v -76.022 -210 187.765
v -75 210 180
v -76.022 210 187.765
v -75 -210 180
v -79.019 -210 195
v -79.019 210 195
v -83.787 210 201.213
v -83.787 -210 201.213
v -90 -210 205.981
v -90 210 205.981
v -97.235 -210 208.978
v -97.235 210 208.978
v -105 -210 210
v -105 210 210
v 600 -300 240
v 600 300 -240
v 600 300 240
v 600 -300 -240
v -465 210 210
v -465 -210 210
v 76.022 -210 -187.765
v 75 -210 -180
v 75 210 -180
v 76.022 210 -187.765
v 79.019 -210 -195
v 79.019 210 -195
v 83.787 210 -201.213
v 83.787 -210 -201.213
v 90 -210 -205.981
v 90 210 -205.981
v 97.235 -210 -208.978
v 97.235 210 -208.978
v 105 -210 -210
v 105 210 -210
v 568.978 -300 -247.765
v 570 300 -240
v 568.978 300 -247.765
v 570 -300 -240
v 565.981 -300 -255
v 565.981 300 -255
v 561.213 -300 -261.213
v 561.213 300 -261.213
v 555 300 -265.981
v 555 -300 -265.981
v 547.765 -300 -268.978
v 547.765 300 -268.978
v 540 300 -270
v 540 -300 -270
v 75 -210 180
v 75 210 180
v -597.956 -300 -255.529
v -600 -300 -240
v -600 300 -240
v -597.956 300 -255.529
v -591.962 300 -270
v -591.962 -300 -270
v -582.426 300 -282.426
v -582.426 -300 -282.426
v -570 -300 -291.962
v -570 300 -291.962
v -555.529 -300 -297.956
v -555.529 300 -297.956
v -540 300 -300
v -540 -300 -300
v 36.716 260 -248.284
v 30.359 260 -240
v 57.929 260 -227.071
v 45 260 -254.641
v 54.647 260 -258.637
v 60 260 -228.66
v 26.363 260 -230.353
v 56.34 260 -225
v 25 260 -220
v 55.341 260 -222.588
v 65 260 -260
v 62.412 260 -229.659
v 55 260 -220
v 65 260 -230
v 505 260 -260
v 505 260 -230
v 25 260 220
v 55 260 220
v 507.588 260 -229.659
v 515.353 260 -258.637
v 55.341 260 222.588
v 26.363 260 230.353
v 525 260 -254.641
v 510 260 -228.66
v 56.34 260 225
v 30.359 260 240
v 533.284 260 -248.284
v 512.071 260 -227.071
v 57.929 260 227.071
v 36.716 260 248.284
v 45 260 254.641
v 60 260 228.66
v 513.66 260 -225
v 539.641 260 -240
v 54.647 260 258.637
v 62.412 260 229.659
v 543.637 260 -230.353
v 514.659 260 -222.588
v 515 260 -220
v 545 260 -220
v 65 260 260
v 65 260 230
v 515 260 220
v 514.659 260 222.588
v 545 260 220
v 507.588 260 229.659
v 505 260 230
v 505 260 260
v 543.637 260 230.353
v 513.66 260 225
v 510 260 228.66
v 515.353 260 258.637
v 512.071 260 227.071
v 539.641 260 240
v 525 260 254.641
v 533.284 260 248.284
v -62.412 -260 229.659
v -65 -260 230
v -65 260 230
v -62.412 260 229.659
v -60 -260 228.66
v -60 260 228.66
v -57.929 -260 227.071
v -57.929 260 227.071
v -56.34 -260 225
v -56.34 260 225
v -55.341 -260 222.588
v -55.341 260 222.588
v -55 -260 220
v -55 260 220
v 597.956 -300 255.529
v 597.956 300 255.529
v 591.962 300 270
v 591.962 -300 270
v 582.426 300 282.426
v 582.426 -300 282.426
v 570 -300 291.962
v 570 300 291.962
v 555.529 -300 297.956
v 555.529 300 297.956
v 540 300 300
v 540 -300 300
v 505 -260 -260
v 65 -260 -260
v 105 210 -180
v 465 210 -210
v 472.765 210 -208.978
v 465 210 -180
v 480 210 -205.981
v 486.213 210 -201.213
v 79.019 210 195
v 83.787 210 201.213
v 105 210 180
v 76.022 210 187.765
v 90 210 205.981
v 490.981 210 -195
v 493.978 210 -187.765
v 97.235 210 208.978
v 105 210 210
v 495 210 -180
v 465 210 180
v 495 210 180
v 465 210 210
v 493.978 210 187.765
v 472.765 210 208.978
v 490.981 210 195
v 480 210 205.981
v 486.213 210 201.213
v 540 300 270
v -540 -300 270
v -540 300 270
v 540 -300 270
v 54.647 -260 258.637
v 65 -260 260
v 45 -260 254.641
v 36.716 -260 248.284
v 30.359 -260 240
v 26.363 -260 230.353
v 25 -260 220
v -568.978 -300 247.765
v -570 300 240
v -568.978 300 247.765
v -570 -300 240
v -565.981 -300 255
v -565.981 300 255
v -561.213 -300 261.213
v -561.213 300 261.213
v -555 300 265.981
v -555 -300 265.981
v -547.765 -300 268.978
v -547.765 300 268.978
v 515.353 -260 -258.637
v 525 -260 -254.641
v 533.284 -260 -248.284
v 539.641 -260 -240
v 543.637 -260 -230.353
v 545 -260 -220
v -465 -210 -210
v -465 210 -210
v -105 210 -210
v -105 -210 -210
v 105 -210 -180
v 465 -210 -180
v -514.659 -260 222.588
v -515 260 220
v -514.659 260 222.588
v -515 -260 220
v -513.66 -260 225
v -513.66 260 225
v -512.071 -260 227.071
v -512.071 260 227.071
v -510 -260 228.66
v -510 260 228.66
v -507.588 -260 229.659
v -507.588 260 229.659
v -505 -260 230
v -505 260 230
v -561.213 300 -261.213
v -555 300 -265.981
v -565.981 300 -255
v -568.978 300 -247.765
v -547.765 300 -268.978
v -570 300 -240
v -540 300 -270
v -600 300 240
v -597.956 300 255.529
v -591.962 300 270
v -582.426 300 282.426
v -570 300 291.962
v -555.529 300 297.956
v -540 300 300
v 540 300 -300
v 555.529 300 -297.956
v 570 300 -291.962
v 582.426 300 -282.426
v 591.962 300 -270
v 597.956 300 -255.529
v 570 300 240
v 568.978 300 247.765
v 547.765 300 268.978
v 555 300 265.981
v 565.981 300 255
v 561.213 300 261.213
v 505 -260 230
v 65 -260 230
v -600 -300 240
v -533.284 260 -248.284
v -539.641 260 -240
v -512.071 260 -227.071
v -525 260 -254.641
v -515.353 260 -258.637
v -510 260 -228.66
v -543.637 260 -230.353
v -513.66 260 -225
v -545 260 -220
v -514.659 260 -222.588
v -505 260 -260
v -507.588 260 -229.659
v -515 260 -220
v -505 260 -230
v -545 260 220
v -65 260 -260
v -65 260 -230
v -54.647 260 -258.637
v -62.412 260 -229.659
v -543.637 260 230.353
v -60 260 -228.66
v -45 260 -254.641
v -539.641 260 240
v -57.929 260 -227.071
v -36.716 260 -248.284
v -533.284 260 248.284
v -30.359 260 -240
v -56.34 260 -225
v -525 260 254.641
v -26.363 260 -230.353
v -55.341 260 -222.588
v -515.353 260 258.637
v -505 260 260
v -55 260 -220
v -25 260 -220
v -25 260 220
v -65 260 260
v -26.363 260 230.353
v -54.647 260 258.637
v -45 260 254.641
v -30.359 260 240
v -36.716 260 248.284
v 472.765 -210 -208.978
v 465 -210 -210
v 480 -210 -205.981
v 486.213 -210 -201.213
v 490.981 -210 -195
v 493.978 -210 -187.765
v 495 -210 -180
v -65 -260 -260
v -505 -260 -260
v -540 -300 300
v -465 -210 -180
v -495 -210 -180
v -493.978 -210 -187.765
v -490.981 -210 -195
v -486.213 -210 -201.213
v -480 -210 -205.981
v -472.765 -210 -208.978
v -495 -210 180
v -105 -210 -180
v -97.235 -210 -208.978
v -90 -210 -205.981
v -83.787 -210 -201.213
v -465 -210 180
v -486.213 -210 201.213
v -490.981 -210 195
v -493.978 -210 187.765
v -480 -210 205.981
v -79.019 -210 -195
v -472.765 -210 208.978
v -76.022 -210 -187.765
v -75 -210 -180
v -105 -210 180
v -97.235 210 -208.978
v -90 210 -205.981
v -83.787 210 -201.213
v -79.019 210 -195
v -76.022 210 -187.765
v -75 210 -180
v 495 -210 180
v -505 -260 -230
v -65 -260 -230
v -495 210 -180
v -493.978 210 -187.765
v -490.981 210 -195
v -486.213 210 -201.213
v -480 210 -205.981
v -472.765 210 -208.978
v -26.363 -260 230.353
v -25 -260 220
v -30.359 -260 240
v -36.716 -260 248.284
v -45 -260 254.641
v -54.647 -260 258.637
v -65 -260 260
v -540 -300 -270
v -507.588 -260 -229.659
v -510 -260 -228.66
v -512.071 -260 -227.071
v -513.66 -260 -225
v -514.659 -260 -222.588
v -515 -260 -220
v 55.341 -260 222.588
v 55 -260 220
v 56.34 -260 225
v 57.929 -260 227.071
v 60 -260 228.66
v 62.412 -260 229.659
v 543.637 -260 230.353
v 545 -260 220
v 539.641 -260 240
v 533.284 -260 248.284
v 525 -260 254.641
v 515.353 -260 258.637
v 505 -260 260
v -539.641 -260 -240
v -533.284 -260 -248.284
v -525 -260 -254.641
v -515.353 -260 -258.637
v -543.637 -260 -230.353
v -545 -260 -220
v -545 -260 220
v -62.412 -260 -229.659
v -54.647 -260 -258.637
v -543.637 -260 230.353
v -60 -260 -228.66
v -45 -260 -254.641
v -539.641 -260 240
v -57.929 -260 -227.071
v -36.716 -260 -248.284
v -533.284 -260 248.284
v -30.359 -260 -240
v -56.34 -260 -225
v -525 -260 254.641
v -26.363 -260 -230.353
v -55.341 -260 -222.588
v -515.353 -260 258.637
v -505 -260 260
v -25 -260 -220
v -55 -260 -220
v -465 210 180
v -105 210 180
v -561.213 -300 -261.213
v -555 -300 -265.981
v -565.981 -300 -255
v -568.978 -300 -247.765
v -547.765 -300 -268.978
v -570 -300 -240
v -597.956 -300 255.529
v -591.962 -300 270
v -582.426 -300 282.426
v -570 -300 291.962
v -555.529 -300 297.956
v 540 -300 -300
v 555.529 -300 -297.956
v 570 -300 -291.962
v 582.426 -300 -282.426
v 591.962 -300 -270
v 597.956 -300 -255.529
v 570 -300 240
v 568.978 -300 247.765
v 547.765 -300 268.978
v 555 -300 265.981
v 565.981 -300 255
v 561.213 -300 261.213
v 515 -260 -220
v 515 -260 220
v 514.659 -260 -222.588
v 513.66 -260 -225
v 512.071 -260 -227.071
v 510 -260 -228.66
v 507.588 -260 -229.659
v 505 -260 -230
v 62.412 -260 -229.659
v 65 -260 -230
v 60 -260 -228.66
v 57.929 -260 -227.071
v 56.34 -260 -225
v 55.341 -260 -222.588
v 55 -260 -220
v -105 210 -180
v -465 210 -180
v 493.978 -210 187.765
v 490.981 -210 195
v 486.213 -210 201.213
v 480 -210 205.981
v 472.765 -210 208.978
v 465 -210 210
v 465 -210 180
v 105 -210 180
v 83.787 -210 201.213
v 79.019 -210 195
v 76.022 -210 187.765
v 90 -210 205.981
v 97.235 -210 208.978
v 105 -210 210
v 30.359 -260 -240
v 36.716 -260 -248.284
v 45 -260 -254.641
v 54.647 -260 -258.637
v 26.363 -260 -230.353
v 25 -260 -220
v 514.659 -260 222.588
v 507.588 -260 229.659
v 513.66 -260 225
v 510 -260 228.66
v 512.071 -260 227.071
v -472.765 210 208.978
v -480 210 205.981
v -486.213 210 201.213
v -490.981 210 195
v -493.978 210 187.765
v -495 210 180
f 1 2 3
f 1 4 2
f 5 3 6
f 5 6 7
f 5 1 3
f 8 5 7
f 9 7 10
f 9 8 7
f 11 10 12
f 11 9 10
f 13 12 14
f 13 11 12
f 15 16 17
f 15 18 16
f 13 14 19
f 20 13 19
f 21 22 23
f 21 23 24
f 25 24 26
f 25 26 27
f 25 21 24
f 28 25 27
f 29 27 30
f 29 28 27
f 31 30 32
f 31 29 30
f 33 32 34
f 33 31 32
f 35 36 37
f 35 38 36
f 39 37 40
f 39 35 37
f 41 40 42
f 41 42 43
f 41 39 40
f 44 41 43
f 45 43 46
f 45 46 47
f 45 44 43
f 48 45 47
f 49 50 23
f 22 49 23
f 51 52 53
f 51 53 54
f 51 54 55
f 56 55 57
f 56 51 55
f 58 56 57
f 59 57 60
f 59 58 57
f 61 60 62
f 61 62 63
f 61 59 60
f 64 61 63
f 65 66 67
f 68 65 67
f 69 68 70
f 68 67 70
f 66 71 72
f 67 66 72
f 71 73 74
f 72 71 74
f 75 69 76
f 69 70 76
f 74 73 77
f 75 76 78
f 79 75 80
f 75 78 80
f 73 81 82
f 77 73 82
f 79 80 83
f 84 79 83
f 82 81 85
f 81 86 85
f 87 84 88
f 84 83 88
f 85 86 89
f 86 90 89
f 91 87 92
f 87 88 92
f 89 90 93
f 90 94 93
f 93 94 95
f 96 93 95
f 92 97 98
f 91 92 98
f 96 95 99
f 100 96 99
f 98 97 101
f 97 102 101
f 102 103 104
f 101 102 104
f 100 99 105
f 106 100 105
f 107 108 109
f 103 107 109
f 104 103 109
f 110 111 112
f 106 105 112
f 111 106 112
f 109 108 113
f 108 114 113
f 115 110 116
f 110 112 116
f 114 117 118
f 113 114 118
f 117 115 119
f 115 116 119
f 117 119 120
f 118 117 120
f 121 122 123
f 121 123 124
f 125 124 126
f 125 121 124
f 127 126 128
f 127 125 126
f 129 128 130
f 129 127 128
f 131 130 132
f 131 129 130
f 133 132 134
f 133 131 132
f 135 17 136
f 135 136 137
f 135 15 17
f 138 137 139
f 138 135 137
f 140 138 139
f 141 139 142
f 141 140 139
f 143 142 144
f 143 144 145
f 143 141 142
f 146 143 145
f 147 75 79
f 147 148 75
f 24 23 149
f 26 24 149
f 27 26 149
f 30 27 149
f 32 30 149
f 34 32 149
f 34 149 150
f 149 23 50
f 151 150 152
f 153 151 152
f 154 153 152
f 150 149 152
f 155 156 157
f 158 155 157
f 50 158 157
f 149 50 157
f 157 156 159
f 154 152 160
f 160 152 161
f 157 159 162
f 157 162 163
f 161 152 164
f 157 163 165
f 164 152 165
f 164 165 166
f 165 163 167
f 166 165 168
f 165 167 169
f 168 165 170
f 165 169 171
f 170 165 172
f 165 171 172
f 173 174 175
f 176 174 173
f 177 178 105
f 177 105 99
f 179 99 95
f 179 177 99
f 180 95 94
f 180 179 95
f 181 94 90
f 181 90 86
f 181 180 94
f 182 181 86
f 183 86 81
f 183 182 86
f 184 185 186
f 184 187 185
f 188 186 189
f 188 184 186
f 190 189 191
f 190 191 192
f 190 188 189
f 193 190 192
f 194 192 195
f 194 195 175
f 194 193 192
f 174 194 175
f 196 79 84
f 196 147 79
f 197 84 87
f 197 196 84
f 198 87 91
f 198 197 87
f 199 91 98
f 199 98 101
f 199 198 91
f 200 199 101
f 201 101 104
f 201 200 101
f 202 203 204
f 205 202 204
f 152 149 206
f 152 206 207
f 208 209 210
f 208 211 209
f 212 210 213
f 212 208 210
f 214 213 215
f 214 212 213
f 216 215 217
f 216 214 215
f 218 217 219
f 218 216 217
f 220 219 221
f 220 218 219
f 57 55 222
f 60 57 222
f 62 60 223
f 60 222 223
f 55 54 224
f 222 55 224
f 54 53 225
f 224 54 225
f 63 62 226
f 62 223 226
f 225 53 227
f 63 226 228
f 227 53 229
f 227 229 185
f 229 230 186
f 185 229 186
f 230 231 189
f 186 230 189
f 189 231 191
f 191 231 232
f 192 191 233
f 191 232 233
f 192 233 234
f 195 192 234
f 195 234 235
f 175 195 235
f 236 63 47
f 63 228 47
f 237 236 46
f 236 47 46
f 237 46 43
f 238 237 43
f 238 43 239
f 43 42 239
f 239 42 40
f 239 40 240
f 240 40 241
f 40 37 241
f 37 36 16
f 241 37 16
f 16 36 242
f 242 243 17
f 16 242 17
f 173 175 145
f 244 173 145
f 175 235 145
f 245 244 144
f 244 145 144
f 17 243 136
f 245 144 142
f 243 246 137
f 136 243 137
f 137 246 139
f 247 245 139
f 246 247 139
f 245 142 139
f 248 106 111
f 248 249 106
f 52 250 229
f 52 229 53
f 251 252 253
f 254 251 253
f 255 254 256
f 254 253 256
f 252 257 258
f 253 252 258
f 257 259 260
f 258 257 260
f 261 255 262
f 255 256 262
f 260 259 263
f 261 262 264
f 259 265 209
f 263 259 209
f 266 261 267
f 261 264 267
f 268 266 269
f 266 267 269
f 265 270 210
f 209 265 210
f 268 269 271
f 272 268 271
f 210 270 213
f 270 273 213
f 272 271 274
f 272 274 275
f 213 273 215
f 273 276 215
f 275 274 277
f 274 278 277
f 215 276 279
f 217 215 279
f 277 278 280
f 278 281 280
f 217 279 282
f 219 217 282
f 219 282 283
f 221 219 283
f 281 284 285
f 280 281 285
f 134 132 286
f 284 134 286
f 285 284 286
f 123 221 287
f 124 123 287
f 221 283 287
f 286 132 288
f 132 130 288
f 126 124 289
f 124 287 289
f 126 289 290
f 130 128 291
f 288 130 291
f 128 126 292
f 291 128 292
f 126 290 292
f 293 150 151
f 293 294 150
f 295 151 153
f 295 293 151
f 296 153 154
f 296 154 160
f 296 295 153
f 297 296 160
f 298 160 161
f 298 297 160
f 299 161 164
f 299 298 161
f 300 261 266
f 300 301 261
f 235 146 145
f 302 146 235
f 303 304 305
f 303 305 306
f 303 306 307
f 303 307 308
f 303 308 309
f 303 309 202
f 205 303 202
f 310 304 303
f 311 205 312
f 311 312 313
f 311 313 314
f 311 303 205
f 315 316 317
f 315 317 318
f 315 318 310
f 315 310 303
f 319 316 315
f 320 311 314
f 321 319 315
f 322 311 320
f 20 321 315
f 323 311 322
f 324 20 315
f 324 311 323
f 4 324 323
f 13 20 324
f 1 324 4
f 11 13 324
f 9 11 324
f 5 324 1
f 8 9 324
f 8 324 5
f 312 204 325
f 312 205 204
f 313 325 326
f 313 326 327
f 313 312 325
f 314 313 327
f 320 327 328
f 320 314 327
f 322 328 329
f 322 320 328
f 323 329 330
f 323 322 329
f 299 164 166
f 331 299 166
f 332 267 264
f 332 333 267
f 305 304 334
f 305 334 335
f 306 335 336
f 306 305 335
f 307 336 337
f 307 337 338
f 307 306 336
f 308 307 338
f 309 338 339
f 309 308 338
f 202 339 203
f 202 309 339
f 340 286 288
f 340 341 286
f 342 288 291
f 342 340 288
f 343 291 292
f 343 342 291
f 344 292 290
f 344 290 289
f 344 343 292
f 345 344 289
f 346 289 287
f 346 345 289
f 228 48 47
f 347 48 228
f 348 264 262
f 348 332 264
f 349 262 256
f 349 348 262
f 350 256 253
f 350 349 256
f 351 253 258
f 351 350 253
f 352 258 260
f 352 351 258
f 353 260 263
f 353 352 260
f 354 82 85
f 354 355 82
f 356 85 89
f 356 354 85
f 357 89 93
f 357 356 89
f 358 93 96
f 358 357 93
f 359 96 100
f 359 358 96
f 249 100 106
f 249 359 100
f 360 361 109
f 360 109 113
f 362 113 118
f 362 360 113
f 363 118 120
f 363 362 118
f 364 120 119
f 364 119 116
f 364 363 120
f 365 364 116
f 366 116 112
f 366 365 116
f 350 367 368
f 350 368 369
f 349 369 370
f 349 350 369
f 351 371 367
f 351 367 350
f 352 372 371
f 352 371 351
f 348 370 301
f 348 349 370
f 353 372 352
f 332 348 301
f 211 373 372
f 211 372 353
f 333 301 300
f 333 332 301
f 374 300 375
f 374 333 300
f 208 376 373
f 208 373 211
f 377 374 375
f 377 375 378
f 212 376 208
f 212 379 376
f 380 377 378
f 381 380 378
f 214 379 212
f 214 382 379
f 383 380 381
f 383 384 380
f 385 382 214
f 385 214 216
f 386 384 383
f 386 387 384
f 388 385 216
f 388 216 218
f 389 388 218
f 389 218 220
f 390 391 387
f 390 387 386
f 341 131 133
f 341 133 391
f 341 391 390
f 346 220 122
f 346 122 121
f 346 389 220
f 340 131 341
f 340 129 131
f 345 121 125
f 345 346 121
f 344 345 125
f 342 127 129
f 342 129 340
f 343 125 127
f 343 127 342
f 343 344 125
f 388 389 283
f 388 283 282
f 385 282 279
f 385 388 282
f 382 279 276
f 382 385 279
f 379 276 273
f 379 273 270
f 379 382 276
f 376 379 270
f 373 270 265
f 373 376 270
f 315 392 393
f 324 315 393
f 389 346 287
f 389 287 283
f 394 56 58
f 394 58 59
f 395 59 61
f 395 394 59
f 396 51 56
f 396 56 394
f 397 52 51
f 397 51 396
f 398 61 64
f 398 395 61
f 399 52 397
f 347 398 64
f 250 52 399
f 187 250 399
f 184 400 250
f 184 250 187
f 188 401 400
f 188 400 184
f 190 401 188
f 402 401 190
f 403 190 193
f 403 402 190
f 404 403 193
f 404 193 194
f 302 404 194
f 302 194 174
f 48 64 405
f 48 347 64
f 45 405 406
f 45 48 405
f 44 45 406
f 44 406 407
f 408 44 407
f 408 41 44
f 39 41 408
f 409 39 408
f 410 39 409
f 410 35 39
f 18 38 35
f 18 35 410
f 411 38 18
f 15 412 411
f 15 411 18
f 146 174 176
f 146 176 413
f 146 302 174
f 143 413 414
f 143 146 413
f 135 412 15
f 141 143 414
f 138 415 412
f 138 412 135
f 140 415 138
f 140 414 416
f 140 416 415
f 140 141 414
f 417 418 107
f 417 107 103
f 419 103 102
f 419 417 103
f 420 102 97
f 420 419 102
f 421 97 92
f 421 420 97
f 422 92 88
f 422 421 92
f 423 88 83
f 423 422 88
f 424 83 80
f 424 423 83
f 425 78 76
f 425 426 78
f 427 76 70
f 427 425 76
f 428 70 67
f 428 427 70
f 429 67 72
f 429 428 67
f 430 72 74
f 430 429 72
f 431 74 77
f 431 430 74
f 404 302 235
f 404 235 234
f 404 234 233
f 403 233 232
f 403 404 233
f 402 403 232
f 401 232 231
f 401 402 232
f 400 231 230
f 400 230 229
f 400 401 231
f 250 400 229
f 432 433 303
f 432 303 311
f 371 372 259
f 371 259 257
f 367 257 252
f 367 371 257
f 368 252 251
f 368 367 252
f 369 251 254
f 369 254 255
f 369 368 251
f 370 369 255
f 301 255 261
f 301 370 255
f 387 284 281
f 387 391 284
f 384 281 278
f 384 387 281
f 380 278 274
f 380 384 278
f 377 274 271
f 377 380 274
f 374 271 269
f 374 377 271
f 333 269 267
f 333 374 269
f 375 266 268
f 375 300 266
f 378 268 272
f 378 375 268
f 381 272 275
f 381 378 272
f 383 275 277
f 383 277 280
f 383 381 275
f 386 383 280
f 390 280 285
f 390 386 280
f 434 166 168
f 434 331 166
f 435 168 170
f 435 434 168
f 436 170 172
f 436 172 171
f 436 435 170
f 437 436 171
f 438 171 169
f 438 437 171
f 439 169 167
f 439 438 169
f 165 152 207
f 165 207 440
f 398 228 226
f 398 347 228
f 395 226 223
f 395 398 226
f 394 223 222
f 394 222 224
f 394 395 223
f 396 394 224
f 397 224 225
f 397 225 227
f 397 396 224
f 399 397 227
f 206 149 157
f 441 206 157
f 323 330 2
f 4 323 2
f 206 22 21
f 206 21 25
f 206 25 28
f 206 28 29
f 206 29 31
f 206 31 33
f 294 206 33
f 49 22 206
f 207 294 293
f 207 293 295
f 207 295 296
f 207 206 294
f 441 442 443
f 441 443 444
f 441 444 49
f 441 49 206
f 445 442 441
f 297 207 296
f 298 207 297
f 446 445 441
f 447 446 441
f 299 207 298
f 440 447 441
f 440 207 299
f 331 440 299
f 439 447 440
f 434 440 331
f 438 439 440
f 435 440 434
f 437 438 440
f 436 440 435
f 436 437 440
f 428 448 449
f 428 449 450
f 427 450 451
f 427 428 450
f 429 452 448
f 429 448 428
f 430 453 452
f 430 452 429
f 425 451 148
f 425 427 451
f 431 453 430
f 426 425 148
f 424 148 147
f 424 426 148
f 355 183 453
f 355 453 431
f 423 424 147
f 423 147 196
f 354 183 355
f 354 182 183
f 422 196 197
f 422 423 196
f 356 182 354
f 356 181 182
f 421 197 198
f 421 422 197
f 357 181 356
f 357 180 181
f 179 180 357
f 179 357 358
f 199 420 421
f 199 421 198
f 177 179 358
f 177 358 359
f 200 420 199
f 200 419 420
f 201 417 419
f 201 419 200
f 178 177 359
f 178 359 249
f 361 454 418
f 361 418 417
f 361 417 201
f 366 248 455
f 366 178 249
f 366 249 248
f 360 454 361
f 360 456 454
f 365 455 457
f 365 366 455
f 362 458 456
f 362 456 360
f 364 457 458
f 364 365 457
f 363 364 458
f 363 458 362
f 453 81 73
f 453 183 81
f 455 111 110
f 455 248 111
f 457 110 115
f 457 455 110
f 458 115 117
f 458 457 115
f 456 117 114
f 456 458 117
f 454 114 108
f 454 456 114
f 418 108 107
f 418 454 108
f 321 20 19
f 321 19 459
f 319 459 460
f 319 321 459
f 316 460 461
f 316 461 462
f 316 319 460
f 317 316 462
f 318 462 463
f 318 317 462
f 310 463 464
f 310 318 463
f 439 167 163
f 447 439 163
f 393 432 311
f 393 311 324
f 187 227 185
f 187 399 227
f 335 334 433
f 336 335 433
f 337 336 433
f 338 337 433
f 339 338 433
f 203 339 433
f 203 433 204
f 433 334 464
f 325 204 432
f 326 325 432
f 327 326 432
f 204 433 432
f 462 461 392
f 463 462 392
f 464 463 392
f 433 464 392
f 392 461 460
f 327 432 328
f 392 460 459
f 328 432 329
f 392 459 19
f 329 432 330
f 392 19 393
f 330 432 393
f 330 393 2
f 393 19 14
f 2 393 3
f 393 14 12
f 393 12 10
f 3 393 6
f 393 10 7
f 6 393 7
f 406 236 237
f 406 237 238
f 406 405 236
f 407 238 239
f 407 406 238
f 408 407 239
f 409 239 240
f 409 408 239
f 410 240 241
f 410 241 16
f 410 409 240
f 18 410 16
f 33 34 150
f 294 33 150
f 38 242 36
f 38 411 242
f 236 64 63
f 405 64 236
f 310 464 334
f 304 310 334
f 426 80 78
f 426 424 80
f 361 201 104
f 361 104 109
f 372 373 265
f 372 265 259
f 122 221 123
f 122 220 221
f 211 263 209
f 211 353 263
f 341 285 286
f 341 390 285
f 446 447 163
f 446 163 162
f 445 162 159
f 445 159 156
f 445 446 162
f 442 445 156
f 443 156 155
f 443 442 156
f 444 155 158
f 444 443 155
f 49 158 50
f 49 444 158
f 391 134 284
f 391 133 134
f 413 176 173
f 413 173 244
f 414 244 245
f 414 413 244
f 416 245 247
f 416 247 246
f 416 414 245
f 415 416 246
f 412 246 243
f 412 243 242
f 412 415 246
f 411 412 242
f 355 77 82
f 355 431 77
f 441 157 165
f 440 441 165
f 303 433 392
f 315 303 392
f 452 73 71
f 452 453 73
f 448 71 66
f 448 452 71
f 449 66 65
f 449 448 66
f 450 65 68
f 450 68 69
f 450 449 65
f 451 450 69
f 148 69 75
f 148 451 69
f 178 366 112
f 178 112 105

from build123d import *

# Parameters (mm, degrees)
F2_DEPTH = 300
F4_DEPTH = 260
F6_W     = 360
F6_H     = 360
F7_DEPTH = 210


with BuildPart() as f2:
    # F1 (on Front) → F2 (new body, symmetric)
    with BuildSketch(Plane.XZ):
        with BuildLine():
            ThreePointArc((600, 240), (582.4264068712, 282.4264068712), (540, 300))
            Line((540, 300), (-540, 300))
            ThreePointArc((-540, 300), (-582.4264068712, 282.4264068712), (-600, 240))
            Line((-600, 240), (-600, -240))
            ThreePointArc((-600, -240), (-582.4264068712, -282.4264068712), (-540, -300))
            Line((-540, -300), (540, -300))
            ThreePointArc((540, -300), (582.4264068712, -282.4264068712), (600, -240))
            Line((600, -240), (600, 240))
        make_face()
        with BuildLine():
            ThreePointArc((540, 270), (561.2132034356, 261.2132034356), (570, 240))
            Line((570, 240), (570, -240))
            ThreePointArc((570, -240), (561.2132034356, -261.2132034356), (540, -270))
            Line((540, -270), (-540, -270))
            ThreePointArc((-540, -270), (-561.2132034356, -261.2132034356), (-570, -240))
            Line((-570, -240), (-570, 240))
            ThreePointArc((-570, 240), (-561.2132034356, 261.2132034356), (-540, 270))
            Line((-540, 270), (540, 270))
        make_face(mode=Mode.SUBTRACT)
    extrude(amount=F2_DEPTH, both=True)


with BuildPart() as f4:
    # F3 (on Front) → F4 (new body, symmetric)
    with BuildSketch(Plane.XZ):
        with BuildLine():
            ThreePointArc((-25, 220), (-36.7157287525, 248.2842712475), (-65, 260))
            Line((-65, 260), (-505, 260))
            ThreePointArc((-505, 260), (-533.2842712475, 248.2842712475), (-545, 220))
            Line((-545, 220), (-545, -220))
            ThreePointArc((-545, -220), (-533.2842712475, -248.2842712475), (-505, -260))
            Line((-505, -260), (-65, -260))
            ThreePointArc((-65, -260), (-36.7157287525, -248.2842712475), (-25, -220))
            Line((-25, -220), (-25, 220))
        make_face()
        with BuildLine():
            Line((-505, 230), (-65, 230))
            ThreePointArc((-65, 230), (-57.9289321881, 227.0710678119), (-55, 220))
            Line((-55, 220), (-55, -220))
            ThreePointArc((-55, -220), (-57.9289321881, -227.0710678119), (-65, -230))
            Line((-65, -230), (-505, -230))
            ThreePointArc((-505, -230), (-512.0710678119, -227.0710678119), (-515, -220))
            Line((-515, -220), (-515, 220))
            ThreePointArc((-515, 220), (-512.0710678119, 227.0710678119), (-505, 230))
        make_face(mode=Mode.SUBTRACT)
    extrude(amount=F4_DEPTH, both=True)


with BuildPart() as f4b:
    # F3 (on Front) → F4, piece 2 (new body, symmetric)
    with BuildSketch(Plane.XZ):
        with BuildLine():
            ThreePointArc((545, 220), (533.2842712475, 248.2842712475), (505, 260))
            Line((505, 260), (65, 260))
            ThreePointArc((65, 260), (36.7157287525, 248.2842712475), (25, 220))
            Line((25, 220), (25, -220))
            ThreePointArc((25, -220), (36.7157287525, -248.2842712475), (65, -260))
            Line((65, -260), (505, -260))
            ThreePointArc((505, -260), (533.2842712475, -248.2842712475), (545, -220))
            Line((545, -220), (545, 220))
        make_face()
        with BuildLine():
            Line((515, 220), (515, -220))
            ThreePointArc((515, -220), (512.0710678119, -227.0710678119), (505, -230))
            Line((505, -230), (65, -230))
            ThreePointArc((65, -230), (57.9289321881, -227.0710678119), (55, -220))
            Line((55, -220), (55, 220))
            ThreePointArc((55, 220), (57.9289321881, 227.0710678119), (65, 230))
            Line((65, 230), (505, 230))
            ThreePointArc((505, 230), (512.0710678119, 227.0710678119), (515, 220))
        make_face(mode=Mode.SUBTRACT)
    extrude(amount=F4_DEPTH, both=True)


with BuildPart() as f4c:
    # F0 (on Front) → F4, piece 3 (new body, symmetric)
    with BuildSketch(Plane.XZ):
        with BuildLine():
            ThreePointArc((505, -260), (533.2842712475, -248.2842712475), (545, -220))
            Line((545, -220), (545, 220))
            ThreePointArc((545, 220), (533.2842712475, 248.2842712475), (505, 260))
            Line((505, 260), (65, 260))
            ThreePointArc((65, 260), (36.7157287525, 248.2842712475), (25, 220))
            Line((25, 220), (25, -220))
            ThreePointArc((25, -220), (36.7157287525, -248.2842712475), (65, -260))
            Line((65, -260), (505, -260))
        make_face()
        with BuildLine():
            Line((515, 220), (515, -220))
            ThreePointArc((515, -220), (512.0710678119, -227.0710678119), (505, -230))
            Line((505, -230), (65, -230))
            ThreePointArc((65, -230), (57.9289321881, -227.0710678119), (55, -220))
            Line((55, -220), (55, 220))
            ThreePointArc((55, 220), (57.9289321881, 227.0710678119), (65, 230))
            Line((65, 230), (505, 230))
            ThreePointArc((505, 230), (512.0710678119, 227.0710678119), (515, 220))
        make_face(mode=Mode.SUBTRACT)
    extrude(amount=F4_DEPTH, both=True)


with BuildPart() as f4d:
    # F0 (on Front) → F4, piece 4 (new body, symmetric)
    with BuildSketch(Plane.XZ):
        with BuildLine():
            ThreePointArc((-25, 220), (-36.7157287525, 248.2842712475), (-65, 260))
            Line((-65, 260), (-505, 260))
            ThreePointArc((-505, 260), (-533.2842712475, 248.2842712475), (-545, 220))
            Line((-545, 220), (-545, -220))
            ThreePointArc((-545, -220), (-533.2842712475, -248.2842712475), (-505, -260))
            Line((-505, -260), (-65, -260))
            ThreePointArc((-65, -260), (-36.7157287525, -248.2842712475), (-25, -220))
            Line((-25, -220), (-25, 220))
        make_face()
        with BuildLine():
            ThreePointArc((-65, 230), (-57.9289321881, 227.0710678119), (-55, 220))
            Line((-55, 220), (-55, -220))
            ThreePointArc((-55, -220), (-57.9289321881, -227.0710678119), (-65, -230))
            Line((-65, -230), (-505, -230))
            ThreePointArc((-505, -230), (-512.0710678119, -227.0710678119), (-515, -220))
            Line((-515, -220), (-515, 220))
            ThreePointArc((-515, 220), (-512.0710678119, 227.0710678119), (-505, 230))
            Line((-505, 230), (-65, 230))
        make_face(mode=Mode.SUBTRACT)
    extrude(amount=F4_DEPTH, both=True)


with BuildPart() as f7:
    # F6 (on Front) → F7 (new body, symmetric)
    with BuildSketch(Plane.XZ):
        with BuildLine():
            ThreePointArc((-75, 180), (-83.7867965644, 201.2132034356), (-105, 210))
            Line((-105, 210), (-465, 210))
            ThreePointArc((-465, 210), (-486.2132034356, 201.2132034356), (-495, 180))
            Line((-495, 180), (-495, -180))
            ThreePointArc((-495, -180), (-486.2132034356, -201.2132034356), (-465, -210))
            Line((-465, -210), (-105, -210))
            ThreePointArc((-105, -210), (-83.7867965644, -201.2132034356), (-75, -180))
            Line((-75, -180), (-75, 180))
        make_face()
        with Locations((-285, 0)):
            Rectangle(F6_W, F6_H, mode=Mode.SUBTRACT)
    extrude(amount=F7_DEPTH, both=True)


with BuildPart() as f7b:
    # F6 (on Front) → F7, piece 2 (new body, symmetric)
    with BuildSketch(Plane.XZ):
        with BuildLine():
            Line((465, 210), (105, 210))
            ThreePointArc((105, 210), (83.7867965644, 201.2132034356), (75, 180))
            Line((75, 180), (75, -180))
            ThreePointArc((75, -180), (83.7867965644, -201.2132034356), (105, -210))
            Line((105, -210), (465, -210))
            ThreePointArc((465, -210), (486.2132034356, -201.2132034356), (495, -180))
            Line((495, -180), (495, 180))
            ThreePointArc((495, 180), (486.2132034356, 201.2132034356), (465, 210))
        make_face()
        with Locations((285, 0)):
            Rectangle(F6_W, F6_H, mode=Mode.SUBTRACT)
    extrude(amount=F7_DEPTH, both=True)


solid = Compound([f2.part, f4c.part, f4d.part, f7.part, f7b.part])
